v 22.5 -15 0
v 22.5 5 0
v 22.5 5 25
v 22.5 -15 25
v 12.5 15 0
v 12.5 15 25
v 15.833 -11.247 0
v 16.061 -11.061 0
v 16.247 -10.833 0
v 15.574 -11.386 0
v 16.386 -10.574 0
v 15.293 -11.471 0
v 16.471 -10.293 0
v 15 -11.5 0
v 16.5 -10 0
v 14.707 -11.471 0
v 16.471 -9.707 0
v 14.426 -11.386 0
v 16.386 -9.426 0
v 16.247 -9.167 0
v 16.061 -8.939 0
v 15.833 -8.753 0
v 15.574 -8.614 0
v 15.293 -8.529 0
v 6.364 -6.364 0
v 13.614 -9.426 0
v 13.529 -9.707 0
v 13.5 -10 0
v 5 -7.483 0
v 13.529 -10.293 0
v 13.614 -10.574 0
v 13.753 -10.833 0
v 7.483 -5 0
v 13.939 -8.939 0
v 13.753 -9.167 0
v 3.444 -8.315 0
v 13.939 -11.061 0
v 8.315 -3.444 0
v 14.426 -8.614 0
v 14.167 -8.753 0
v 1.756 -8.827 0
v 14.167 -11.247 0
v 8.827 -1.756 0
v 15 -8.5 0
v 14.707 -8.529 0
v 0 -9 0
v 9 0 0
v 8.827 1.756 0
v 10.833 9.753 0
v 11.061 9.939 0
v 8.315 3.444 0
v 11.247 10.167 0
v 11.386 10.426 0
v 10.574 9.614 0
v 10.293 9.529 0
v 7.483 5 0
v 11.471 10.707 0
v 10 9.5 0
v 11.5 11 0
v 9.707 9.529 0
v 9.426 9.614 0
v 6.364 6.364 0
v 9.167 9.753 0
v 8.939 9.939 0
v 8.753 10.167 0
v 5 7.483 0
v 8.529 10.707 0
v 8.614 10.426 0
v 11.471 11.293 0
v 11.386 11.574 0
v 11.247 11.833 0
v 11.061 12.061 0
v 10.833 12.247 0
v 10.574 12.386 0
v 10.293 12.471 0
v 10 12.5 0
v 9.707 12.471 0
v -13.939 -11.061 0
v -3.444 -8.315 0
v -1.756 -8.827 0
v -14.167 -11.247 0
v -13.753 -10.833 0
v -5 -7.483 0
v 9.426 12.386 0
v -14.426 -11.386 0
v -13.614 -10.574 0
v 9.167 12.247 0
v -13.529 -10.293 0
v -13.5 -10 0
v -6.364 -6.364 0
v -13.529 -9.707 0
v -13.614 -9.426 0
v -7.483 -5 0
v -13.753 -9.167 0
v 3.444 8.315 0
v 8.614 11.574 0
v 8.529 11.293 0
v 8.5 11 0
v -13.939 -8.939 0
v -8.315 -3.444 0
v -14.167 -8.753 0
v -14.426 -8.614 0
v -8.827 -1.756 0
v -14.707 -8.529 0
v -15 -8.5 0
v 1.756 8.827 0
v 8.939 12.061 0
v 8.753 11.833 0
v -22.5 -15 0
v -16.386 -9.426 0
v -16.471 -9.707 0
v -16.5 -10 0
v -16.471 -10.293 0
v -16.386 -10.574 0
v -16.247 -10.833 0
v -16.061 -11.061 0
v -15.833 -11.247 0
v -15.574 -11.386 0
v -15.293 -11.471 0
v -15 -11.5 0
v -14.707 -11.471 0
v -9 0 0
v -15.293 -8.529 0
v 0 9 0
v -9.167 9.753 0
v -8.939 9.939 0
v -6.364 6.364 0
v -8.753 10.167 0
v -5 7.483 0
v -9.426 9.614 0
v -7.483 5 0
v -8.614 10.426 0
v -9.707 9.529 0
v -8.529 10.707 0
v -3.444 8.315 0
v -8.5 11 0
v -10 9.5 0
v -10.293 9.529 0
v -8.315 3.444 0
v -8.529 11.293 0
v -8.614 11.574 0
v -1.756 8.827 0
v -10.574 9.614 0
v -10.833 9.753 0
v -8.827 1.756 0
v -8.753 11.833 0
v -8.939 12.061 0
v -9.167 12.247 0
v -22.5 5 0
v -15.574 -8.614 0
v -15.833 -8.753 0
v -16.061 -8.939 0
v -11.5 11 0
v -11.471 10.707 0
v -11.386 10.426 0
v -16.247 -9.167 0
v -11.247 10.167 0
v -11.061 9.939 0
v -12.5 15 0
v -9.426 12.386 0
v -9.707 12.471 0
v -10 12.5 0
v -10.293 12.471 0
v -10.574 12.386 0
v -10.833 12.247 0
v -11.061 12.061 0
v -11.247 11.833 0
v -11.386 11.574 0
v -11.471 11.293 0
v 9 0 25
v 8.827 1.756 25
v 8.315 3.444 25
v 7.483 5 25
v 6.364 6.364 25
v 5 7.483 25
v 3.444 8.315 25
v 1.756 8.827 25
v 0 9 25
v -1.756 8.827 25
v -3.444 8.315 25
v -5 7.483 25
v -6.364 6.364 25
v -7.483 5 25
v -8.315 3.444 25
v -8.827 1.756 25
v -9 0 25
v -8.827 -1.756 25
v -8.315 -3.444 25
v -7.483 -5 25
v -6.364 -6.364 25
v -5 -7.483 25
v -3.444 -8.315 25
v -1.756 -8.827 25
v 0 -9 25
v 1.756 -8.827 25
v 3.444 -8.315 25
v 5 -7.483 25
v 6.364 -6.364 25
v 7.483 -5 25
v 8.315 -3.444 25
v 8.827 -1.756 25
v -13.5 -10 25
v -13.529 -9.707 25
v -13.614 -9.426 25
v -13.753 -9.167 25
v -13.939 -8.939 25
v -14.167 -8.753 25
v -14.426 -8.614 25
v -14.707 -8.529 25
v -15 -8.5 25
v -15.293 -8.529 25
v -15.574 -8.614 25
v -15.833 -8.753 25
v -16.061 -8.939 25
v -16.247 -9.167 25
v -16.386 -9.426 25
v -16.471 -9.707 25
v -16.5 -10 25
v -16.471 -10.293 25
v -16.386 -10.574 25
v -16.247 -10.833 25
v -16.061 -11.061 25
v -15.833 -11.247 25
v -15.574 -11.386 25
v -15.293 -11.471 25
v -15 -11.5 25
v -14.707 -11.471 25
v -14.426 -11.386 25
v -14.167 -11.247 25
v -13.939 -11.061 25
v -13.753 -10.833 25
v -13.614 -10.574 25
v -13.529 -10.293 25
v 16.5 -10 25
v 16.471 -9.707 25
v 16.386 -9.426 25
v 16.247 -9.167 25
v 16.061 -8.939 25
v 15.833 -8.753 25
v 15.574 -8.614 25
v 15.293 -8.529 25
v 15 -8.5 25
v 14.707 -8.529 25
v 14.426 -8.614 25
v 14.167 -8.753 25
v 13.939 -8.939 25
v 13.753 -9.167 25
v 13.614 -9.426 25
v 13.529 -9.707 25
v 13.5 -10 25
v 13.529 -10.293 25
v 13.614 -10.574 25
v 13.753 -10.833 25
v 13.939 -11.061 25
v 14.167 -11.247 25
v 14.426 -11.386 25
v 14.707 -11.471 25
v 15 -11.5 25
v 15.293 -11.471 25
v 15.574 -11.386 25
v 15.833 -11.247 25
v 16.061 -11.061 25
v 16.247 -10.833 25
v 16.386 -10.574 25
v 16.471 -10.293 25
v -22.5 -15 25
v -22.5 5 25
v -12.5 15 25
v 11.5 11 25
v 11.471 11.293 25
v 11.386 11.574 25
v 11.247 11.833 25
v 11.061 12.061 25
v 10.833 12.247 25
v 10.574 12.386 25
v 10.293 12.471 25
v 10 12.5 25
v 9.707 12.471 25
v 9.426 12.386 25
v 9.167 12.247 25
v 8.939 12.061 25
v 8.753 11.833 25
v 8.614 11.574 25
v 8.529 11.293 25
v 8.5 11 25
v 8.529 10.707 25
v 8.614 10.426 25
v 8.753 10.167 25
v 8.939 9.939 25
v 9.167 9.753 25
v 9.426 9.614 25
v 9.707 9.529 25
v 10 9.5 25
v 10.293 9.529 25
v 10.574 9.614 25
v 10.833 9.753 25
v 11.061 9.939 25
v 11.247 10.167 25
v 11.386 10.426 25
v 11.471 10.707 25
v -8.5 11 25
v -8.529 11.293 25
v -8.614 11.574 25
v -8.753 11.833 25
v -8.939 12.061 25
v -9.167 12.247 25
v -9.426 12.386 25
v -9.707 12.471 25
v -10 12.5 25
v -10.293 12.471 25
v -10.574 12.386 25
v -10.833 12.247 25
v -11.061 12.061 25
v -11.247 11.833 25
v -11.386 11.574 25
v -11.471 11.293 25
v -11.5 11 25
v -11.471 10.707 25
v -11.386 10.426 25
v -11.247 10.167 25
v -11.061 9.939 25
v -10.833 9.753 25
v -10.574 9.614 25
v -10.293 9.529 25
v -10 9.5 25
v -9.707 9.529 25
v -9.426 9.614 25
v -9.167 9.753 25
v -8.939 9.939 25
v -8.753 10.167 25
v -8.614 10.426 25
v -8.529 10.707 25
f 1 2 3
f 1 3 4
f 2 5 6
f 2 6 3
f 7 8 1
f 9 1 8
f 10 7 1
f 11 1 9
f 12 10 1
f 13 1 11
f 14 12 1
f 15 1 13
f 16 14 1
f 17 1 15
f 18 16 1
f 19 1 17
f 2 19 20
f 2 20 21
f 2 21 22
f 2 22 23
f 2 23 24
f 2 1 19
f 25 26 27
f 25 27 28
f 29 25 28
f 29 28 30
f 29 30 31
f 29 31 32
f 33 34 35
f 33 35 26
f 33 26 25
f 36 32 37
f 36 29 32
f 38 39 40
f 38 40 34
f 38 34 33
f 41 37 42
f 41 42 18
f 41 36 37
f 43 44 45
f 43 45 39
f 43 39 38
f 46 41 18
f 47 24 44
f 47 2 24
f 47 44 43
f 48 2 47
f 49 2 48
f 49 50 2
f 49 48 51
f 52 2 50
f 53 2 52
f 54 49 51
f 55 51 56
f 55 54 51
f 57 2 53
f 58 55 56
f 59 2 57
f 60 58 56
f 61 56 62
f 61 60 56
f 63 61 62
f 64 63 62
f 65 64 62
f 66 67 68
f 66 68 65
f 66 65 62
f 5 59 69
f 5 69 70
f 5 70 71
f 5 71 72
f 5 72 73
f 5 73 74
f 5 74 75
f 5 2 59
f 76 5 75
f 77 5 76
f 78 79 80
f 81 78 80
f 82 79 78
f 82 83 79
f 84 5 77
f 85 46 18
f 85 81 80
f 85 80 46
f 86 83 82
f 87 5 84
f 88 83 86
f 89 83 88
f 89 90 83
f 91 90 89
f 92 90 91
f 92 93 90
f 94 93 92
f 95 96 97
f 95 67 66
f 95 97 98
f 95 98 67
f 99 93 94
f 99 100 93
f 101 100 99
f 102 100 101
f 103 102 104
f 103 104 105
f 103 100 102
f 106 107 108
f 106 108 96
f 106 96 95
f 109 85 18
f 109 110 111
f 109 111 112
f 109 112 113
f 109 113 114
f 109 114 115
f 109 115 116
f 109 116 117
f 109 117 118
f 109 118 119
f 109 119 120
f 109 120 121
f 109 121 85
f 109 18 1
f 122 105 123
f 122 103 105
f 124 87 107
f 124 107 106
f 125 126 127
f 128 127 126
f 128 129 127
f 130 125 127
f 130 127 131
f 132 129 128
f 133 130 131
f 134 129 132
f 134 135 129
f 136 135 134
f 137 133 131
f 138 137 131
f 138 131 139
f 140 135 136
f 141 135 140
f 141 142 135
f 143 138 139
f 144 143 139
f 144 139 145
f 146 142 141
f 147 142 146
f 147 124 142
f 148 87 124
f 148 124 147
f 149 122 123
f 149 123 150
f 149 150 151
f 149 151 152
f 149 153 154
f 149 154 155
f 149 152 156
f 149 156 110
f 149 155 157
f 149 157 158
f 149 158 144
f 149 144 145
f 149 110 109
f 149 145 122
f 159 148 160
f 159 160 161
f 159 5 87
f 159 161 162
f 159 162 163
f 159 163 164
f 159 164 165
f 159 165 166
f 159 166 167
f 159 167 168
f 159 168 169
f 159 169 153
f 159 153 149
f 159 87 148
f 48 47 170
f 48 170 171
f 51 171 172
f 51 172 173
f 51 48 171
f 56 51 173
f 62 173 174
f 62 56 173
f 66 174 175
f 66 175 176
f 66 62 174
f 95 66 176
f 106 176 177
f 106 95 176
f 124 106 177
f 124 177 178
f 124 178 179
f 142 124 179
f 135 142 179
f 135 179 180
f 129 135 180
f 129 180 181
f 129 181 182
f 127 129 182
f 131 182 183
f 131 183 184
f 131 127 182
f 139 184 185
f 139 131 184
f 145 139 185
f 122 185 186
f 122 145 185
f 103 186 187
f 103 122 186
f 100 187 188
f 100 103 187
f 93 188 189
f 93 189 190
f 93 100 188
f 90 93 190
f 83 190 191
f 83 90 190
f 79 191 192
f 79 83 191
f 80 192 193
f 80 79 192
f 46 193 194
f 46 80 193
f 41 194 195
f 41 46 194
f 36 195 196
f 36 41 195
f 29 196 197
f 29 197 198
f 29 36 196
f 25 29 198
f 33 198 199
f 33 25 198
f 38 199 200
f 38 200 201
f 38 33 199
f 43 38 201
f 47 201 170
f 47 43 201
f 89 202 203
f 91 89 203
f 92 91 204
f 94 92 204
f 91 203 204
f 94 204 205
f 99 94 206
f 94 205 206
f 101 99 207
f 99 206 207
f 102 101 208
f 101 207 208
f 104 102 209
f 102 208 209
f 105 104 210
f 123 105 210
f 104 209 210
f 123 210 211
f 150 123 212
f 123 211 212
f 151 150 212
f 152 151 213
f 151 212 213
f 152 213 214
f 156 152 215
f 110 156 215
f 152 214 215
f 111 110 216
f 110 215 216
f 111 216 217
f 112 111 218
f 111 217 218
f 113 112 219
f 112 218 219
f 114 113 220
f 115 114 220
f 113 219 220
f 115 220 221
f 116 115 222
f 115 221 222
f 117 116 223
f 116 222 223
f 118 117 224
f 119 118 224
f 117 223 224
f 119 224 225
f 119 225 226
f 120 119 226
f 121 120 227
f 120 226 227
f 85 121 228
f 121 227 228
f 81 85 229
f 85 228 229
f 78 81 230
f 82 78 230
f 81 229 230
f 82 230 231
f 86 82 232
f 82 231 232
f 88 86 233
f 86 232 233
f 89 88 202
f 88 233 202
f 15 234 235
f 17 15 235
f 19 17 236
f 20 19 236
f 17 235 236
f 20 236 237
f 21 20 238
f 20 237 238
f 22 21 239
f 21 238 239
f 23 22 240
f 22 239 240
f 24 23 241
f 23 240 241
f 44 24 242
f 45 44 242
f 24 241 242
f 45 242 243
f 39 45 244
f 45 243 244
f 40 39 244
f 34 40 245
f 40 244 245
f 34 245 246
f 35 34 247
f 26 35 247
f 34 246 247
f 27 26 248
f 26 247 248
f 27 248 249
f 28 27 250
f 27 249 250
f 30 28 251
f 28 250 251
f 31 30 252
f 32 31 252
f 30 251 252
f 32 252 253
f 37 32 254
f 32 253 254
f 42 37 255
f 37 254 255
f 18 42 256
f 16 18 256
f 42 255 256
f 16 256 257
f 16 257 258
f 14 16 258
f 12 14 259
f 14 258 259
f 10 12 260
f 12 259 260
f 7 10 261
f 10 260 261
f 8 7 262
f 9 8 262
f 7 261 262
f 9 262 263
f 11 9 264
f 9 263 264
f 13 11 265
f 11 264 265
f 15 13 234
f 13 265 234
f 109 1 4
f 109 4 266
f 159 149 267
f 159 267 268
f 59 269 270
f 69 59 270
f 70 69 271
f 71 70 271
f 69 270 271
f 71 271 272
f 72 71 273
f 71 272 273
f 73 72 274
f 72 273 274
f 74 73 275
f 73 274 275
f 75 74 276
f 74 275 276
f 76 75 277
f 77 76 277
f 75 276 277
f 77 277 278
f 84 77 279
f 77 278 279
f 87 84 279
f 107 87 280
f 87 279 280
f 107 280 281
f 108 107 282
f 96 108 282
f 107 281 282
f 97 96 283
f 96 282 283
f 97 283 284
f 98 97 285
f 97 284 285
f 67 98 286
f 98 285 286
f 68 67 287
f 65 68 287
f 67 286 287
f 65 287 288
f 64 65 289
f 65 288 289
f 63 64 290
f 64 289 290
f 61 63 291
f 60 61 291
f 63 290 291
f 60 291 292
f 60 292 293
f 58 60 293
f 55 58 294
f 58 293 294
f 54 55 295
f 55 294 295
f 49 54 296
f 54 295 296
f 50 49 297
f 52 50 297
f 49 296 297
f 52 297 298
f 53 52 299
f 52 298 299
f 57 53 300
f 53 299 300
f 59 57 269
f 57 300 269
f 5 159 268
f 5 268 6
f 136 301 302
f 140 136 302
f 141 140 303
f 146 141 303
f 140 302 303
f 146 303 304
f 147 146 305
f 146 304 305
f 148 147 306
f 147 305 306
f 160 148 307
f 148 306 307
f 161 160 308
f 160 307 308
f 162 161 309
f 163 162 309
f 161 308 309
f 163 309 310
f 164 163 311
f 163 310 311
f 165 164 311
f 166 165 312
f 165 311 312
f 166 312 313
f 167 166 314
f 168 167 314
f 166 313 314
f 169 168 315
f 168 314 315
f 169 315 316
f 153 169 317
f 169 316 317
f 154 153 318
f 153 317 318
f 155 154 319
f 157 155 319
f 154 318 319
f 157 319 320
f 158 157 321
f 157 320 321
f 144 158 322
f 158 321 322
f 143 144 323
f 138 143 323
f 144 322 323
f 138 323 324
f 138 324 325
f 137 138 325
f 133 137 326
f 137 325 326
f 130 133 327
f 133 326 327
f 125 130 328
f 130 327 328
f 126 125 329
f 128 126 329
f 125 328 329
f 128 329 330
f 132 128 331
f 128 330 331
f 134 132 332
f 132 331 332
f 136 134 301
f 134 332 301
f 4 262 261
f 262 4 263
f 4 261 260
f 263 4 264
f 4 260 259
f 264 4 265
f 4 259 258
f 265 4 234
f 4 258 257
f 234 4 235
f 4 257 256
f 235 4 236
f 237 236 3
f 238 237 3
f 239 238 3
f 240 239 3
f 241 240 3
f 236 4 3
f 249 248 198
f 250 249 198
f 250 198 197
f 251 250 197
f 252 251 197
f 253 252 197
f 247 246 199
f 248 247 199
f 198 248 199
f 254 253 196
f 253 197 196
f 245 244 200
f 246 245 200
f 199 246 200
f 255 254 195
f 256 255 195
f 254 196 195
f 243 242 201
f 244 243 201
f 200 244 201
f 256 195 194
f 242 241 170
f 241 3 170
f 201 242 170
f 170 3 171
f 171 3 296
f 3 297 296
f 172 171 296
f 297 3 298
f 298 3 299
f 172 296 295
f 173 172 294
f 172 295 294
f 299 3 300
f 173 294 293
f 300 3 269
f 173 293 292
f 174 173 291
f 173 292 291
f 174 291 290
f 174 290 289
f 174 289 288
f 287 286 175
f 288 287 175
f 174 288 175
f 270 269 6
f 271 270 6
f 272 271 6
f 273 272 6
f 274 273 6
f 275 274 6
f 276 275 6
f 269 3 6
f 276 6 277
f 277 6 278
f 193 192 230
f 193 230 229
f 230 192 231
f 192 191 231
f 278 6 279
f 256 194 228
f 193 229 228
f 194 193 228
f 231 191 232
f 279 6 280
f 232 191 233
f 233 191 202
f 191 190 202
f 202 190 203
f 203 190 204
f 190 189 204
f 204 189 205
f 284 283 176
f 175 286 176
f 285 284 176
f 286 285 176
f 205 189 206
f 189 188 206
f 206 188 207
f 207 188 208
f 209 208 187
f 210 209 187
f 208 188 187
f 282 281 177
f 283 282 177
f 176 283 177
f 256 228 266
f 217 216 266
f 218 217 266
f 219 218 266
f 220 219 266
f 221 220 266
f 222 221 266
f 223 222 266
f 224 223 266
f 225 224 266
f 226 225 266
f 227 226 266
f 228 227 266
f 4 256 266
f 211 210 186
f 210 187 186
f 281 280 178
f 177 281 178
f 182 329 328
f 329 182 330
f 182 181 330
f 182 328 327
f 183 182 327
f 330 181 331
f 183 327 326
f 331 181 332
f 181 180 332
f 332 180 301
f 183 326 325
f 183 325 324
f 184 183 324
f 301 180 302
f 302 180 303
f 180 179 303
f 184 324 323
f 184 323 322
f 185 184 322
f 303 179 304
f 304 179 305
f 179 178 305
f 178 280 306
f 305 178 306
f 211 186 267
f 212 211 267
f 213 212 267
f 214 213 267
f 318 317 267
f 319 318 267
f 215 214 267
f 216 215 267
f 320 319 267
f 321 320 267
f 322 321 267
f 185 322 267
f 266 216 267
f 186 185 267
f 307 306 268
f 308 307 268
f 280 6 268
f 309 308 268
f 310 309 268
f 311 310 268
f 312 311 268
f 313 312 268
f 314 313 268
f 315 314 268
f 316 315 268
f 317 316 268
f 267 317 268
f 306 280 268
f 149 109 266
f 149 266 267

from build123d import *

# Parameters (mm, degrees)
CROQUIS1_R              = 9
SALIENTE_EXTRUIR1_DEPTH = 25
CROQUIS2_R              = 1.5
CORTAR_EXTRUIR1_DEPTH   = 25


with BuildPart() as part:
    # Croquis1 → Saliente-Extruir1 (new body)
    with BuildSketch(Plane.XY):
        Polygon((-22.5, 5), (-12.5, 15), (12.5, 15), (22.5, 5), (22.5, -15), (-22.5, -15), align=None)
        Circle(CROQUIS1_R, mode=Mode.SUBTRACT)
    extrude(amount=SALIENTE_EXTRUIR1_DEPTH)

    # Croquis2 → Cortar-Extruir1 (cut)
    with BuildSketch(Plane.XY.offset(25)):
        with Locations((-15, -10)):
            Circle(CROQUIS2_R)
        with Locations((15, -10)):
            Circle(CROQUIS2_R)
        with Locations((-10, 11)):
            Circle(CROQUIS2_R)
        with Locations((10, 11)):
            Circle(CROQUIS2_R)
    extrude(amount=-CORTAR_EXTRUIR1_DEPTH, mode=Mode.SUBTRACT)


solid = part.part
